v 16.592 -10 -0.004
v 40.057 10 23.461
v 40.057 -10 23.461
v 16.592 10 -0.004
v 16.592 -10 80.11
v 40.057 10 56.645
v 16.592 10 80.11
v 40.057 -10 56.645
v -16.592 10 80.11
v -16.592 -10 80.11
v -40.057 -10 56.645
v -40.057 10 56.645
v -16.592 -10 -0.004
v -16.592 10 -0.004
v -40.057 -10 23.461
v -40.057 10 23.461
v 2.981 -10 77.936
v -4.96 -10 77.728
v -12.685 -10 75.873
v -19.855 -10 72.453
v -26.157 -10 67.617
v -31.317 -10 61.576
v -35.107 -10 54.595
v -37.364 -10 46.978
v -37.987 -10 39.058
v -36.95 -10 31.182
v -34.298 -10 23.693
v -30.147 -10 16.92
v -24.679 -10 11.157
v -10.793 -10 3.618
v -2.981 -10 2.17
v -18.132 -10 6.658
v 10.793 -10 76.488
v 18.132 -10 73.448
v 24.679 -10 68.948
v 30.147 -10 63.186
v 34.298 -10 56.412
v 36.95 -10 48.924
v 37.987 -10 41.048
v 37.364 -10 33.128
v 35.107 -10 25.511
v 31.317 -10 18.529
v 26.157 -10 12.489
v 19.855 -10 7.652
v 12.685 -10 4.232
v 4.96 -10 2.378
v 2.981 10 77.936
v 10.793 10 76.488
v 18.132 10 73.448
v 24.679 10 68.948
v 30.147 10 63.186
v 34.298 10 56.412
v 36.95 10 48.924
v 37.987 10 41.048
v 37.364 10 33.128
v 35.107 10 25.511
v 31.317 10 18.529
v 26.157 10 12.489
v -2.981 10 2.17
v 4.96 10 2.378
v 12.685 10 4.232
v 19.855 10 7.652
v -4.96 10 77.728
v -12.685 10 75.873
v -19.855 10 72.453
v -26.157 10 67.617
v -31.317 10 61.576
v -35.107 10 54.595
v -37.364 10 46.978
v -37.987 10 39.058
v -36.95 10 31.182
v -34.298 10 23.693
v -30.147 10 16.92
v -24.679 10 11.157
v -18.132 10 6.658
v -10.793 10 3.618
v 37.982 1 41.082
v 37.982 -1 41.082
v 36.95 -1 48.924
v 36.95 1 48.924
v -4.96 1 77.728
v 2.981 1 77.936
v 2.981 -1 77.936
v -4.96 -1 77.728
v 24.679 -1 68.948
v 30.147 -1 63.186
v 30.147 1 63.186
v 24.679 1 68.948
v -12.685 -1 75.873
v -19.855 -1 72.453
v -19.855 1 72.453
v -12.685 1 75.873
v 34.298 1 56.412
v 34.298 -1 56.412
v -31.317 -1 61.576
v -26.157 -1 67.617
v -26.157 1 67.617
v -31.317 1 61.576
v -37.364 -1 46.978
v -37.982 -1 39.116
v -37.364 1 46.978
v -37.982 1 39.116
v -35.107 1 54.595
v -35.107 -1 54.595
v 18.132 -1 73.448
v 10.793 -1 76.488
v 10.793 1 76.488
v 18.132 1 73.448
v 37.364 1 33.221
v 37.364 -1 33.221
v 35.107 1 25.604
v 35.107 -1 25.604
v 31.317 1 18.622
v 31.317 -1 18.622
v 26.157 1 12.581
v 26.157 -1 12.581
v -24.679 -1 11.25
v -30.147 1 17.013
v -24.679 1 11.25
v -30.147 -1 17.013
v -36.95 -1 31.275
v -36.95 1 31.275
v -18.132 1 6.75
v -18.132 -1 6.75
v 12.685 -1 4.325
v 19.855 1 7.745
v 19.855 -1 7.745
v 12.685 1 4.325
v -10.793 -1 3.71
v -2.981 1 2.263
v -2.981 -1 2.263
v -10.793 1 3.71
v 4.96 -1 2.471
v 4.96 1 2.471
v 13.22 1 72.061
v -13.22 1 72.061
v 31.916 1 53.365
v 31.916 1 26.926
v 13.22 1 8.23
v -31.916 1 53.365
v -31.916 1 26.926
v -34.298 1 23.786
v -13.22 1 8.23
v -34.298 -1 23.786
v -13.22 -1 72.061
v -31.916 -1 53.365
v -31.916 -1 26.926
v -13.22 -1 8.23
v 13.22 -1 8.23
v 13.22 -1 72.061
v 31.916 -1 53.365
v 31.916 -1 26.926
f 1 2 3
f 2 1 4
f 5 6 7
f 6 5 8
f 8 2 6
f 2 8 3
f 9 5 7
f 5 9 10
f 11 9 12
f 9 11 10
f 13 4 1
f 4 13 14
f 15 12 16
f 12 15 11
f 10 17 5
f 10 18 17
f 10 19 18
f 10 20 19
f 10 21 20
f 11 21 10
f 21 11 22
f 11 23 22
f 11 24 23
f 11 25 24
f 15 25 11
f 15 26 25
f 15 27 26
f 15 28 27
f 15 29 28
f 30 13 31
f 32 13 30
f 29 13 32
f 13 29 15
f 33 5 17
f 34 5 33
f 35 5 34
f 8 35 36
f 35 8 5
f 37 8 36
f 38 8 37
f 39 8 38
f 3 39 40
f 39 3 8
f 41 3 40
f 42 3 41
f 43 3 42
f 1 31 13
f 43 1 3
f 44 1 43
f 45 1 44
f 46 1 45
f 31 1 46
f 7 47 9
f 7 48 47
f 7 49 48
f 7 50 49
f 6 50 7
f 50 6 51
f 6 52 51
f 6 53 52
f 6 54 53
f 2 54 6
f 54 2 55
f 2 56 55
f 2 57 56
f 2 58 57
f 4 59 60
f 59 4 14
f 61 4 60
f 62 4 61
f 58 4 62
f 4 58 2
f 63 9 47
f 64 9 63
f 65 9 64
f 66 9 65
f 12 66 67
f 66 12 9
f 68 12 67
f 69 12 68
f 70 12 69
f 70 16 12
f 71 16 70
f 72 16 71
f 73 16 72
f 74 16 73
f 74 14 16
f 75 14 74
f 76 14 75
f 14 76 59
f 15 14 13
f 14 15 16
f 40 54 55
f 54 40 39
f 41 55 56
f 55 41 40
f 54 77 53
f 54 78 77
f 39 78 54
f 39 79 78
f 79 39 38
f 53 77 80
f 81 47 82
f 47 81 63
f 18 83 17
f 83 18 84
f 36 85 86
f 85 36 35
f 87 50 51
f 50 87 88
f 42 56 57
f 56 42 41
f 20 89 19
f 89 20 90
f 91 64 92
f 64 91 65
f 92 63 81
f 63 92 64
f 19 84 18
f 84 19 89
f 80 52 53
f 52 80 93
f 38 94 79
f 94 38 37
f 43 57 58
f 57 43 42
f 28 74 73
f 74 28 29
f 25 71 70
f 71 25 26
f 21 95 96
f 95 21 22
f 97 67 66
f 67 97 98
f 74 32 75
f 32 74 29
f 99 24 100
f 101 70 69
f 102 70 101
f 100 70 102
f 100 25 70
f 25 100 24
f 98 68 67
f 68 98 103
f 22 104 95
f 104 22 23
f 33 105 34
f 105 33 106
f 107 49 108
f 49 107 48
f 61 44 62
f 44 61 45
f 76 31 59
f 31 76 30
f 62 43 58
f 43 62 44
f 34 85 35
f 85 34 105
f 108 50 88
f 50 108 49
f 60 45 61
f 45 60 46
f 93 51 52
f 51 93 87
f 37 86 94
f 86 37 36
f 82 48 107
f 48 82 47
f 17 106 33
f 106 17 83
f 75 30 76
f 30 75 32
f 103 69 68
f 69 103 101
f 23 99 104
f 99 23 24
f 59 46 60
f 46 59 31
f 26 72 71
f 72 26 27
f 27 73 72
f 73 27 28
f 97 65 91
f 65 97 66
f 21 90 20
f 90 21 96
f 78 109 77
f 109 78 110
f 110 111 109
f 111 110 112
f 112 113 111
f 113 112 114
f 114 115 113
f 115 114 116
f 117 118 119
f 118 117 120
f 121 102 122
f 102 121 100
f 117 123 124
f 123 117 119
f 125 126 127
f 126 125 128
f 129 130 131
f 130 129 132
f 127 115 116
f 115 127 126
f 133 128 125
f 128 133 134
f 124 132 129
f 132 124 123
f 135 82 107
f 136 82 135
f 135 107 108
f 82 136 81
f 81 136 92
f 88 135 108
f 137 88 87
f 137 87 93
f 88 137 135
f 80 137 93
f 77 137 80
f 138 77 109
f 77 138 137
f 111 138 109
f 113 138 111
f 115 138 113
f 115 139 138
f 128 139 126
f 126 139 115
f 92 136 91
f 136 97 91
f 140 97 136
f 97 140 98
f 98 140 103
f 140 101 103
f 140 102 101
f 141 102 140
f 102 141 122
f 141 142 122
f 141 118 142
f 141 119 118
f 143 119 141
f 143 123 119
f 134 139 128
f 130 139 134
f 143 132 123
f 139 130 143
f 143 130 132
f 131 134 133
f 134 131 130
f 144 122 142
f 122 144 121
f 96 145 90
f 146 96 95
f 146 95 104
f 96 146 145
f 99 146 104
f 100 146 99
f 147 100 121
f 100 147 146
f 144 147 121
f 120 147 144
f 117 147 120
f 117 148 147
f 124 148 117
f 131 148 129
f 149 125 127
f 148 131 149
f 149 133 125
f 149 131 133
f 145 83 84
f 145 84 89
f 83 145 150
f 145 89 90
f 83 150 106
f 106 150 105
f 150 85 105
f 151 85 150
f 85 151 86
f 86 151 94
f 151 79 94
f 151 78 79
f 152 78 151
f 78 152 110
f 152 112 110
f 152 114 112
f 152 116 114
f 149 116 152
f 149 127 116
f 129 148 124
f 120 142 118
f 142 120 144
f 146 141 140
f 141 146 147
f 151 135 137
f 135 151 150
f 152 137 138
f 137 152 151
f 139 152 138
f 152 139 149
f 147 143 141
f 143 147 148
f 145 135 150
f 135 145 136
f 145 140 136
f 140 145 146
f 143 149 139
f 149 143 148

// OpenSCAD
// [FL_INDEX: keywords="openscad, 3d_parametric, Can_Stacking_Plate, csg_solid" | COT="Parametric OpenSCAD design from 3DCodeverse"]
// Title: Can Stacking Plate

// Can Stacking Plate:
//
//	Simple Cylinder with plate to help stacking cans in the pantry.
//   We use 45 degree settings to allow overhang printing if required.
//

// In mm.
	DiameterOfCan = 75; 

// In mm.
	HeightOfStacker = 20;

	InnerSpacing = 1 * 1;
	ThicknessOfCylinder = DiameterOfCan/7; 
	ThicknessOfPlate = 2 * 1;
	HeightOfPlate = ( HeightOfStacker - ThicknessOfPlate)/2 ;

// Offset and rotate for build platform.

	translate([0,HeightOfStacker/2,(DiameterOfCan + InnerSpacing+ThicknessOfCylinder)/2.165 ]) 
	rotate([90,45/2,0]) 

// Generate outer cylinder

	difference() {

		cylinder( h=HeightOfStacker, r=(DiameterOfCan + InnerSpacing + ThicknessOfCylinder)/2, $fa = 45);
 		cylinder( h=HeightOfStacker, r=(DiameterOfCan + InnerSpacing)/2, $fs = 1 );
	}

// Offset and rotate for build platform.

	translate([0,HeightOfStacker/2,(DiameterOfCan + InnerSpacing+ ThicknessOfCylinder)/2.16 ]) 
	rotate([90,45/2,0])	
	translate([0,0,HeightOfPlate ])

// Generate inner support.
	
	difference() {
		cylinder( h=ThicknessOfPlate, r=(DiameterOfCan + InnerSpacing)/2, $fs = 1);
		cylinder( h=ThicknessOfPlate, r=(DiameterOfCan + InnerSpacing)/2.2, $fs = 30);
	}
